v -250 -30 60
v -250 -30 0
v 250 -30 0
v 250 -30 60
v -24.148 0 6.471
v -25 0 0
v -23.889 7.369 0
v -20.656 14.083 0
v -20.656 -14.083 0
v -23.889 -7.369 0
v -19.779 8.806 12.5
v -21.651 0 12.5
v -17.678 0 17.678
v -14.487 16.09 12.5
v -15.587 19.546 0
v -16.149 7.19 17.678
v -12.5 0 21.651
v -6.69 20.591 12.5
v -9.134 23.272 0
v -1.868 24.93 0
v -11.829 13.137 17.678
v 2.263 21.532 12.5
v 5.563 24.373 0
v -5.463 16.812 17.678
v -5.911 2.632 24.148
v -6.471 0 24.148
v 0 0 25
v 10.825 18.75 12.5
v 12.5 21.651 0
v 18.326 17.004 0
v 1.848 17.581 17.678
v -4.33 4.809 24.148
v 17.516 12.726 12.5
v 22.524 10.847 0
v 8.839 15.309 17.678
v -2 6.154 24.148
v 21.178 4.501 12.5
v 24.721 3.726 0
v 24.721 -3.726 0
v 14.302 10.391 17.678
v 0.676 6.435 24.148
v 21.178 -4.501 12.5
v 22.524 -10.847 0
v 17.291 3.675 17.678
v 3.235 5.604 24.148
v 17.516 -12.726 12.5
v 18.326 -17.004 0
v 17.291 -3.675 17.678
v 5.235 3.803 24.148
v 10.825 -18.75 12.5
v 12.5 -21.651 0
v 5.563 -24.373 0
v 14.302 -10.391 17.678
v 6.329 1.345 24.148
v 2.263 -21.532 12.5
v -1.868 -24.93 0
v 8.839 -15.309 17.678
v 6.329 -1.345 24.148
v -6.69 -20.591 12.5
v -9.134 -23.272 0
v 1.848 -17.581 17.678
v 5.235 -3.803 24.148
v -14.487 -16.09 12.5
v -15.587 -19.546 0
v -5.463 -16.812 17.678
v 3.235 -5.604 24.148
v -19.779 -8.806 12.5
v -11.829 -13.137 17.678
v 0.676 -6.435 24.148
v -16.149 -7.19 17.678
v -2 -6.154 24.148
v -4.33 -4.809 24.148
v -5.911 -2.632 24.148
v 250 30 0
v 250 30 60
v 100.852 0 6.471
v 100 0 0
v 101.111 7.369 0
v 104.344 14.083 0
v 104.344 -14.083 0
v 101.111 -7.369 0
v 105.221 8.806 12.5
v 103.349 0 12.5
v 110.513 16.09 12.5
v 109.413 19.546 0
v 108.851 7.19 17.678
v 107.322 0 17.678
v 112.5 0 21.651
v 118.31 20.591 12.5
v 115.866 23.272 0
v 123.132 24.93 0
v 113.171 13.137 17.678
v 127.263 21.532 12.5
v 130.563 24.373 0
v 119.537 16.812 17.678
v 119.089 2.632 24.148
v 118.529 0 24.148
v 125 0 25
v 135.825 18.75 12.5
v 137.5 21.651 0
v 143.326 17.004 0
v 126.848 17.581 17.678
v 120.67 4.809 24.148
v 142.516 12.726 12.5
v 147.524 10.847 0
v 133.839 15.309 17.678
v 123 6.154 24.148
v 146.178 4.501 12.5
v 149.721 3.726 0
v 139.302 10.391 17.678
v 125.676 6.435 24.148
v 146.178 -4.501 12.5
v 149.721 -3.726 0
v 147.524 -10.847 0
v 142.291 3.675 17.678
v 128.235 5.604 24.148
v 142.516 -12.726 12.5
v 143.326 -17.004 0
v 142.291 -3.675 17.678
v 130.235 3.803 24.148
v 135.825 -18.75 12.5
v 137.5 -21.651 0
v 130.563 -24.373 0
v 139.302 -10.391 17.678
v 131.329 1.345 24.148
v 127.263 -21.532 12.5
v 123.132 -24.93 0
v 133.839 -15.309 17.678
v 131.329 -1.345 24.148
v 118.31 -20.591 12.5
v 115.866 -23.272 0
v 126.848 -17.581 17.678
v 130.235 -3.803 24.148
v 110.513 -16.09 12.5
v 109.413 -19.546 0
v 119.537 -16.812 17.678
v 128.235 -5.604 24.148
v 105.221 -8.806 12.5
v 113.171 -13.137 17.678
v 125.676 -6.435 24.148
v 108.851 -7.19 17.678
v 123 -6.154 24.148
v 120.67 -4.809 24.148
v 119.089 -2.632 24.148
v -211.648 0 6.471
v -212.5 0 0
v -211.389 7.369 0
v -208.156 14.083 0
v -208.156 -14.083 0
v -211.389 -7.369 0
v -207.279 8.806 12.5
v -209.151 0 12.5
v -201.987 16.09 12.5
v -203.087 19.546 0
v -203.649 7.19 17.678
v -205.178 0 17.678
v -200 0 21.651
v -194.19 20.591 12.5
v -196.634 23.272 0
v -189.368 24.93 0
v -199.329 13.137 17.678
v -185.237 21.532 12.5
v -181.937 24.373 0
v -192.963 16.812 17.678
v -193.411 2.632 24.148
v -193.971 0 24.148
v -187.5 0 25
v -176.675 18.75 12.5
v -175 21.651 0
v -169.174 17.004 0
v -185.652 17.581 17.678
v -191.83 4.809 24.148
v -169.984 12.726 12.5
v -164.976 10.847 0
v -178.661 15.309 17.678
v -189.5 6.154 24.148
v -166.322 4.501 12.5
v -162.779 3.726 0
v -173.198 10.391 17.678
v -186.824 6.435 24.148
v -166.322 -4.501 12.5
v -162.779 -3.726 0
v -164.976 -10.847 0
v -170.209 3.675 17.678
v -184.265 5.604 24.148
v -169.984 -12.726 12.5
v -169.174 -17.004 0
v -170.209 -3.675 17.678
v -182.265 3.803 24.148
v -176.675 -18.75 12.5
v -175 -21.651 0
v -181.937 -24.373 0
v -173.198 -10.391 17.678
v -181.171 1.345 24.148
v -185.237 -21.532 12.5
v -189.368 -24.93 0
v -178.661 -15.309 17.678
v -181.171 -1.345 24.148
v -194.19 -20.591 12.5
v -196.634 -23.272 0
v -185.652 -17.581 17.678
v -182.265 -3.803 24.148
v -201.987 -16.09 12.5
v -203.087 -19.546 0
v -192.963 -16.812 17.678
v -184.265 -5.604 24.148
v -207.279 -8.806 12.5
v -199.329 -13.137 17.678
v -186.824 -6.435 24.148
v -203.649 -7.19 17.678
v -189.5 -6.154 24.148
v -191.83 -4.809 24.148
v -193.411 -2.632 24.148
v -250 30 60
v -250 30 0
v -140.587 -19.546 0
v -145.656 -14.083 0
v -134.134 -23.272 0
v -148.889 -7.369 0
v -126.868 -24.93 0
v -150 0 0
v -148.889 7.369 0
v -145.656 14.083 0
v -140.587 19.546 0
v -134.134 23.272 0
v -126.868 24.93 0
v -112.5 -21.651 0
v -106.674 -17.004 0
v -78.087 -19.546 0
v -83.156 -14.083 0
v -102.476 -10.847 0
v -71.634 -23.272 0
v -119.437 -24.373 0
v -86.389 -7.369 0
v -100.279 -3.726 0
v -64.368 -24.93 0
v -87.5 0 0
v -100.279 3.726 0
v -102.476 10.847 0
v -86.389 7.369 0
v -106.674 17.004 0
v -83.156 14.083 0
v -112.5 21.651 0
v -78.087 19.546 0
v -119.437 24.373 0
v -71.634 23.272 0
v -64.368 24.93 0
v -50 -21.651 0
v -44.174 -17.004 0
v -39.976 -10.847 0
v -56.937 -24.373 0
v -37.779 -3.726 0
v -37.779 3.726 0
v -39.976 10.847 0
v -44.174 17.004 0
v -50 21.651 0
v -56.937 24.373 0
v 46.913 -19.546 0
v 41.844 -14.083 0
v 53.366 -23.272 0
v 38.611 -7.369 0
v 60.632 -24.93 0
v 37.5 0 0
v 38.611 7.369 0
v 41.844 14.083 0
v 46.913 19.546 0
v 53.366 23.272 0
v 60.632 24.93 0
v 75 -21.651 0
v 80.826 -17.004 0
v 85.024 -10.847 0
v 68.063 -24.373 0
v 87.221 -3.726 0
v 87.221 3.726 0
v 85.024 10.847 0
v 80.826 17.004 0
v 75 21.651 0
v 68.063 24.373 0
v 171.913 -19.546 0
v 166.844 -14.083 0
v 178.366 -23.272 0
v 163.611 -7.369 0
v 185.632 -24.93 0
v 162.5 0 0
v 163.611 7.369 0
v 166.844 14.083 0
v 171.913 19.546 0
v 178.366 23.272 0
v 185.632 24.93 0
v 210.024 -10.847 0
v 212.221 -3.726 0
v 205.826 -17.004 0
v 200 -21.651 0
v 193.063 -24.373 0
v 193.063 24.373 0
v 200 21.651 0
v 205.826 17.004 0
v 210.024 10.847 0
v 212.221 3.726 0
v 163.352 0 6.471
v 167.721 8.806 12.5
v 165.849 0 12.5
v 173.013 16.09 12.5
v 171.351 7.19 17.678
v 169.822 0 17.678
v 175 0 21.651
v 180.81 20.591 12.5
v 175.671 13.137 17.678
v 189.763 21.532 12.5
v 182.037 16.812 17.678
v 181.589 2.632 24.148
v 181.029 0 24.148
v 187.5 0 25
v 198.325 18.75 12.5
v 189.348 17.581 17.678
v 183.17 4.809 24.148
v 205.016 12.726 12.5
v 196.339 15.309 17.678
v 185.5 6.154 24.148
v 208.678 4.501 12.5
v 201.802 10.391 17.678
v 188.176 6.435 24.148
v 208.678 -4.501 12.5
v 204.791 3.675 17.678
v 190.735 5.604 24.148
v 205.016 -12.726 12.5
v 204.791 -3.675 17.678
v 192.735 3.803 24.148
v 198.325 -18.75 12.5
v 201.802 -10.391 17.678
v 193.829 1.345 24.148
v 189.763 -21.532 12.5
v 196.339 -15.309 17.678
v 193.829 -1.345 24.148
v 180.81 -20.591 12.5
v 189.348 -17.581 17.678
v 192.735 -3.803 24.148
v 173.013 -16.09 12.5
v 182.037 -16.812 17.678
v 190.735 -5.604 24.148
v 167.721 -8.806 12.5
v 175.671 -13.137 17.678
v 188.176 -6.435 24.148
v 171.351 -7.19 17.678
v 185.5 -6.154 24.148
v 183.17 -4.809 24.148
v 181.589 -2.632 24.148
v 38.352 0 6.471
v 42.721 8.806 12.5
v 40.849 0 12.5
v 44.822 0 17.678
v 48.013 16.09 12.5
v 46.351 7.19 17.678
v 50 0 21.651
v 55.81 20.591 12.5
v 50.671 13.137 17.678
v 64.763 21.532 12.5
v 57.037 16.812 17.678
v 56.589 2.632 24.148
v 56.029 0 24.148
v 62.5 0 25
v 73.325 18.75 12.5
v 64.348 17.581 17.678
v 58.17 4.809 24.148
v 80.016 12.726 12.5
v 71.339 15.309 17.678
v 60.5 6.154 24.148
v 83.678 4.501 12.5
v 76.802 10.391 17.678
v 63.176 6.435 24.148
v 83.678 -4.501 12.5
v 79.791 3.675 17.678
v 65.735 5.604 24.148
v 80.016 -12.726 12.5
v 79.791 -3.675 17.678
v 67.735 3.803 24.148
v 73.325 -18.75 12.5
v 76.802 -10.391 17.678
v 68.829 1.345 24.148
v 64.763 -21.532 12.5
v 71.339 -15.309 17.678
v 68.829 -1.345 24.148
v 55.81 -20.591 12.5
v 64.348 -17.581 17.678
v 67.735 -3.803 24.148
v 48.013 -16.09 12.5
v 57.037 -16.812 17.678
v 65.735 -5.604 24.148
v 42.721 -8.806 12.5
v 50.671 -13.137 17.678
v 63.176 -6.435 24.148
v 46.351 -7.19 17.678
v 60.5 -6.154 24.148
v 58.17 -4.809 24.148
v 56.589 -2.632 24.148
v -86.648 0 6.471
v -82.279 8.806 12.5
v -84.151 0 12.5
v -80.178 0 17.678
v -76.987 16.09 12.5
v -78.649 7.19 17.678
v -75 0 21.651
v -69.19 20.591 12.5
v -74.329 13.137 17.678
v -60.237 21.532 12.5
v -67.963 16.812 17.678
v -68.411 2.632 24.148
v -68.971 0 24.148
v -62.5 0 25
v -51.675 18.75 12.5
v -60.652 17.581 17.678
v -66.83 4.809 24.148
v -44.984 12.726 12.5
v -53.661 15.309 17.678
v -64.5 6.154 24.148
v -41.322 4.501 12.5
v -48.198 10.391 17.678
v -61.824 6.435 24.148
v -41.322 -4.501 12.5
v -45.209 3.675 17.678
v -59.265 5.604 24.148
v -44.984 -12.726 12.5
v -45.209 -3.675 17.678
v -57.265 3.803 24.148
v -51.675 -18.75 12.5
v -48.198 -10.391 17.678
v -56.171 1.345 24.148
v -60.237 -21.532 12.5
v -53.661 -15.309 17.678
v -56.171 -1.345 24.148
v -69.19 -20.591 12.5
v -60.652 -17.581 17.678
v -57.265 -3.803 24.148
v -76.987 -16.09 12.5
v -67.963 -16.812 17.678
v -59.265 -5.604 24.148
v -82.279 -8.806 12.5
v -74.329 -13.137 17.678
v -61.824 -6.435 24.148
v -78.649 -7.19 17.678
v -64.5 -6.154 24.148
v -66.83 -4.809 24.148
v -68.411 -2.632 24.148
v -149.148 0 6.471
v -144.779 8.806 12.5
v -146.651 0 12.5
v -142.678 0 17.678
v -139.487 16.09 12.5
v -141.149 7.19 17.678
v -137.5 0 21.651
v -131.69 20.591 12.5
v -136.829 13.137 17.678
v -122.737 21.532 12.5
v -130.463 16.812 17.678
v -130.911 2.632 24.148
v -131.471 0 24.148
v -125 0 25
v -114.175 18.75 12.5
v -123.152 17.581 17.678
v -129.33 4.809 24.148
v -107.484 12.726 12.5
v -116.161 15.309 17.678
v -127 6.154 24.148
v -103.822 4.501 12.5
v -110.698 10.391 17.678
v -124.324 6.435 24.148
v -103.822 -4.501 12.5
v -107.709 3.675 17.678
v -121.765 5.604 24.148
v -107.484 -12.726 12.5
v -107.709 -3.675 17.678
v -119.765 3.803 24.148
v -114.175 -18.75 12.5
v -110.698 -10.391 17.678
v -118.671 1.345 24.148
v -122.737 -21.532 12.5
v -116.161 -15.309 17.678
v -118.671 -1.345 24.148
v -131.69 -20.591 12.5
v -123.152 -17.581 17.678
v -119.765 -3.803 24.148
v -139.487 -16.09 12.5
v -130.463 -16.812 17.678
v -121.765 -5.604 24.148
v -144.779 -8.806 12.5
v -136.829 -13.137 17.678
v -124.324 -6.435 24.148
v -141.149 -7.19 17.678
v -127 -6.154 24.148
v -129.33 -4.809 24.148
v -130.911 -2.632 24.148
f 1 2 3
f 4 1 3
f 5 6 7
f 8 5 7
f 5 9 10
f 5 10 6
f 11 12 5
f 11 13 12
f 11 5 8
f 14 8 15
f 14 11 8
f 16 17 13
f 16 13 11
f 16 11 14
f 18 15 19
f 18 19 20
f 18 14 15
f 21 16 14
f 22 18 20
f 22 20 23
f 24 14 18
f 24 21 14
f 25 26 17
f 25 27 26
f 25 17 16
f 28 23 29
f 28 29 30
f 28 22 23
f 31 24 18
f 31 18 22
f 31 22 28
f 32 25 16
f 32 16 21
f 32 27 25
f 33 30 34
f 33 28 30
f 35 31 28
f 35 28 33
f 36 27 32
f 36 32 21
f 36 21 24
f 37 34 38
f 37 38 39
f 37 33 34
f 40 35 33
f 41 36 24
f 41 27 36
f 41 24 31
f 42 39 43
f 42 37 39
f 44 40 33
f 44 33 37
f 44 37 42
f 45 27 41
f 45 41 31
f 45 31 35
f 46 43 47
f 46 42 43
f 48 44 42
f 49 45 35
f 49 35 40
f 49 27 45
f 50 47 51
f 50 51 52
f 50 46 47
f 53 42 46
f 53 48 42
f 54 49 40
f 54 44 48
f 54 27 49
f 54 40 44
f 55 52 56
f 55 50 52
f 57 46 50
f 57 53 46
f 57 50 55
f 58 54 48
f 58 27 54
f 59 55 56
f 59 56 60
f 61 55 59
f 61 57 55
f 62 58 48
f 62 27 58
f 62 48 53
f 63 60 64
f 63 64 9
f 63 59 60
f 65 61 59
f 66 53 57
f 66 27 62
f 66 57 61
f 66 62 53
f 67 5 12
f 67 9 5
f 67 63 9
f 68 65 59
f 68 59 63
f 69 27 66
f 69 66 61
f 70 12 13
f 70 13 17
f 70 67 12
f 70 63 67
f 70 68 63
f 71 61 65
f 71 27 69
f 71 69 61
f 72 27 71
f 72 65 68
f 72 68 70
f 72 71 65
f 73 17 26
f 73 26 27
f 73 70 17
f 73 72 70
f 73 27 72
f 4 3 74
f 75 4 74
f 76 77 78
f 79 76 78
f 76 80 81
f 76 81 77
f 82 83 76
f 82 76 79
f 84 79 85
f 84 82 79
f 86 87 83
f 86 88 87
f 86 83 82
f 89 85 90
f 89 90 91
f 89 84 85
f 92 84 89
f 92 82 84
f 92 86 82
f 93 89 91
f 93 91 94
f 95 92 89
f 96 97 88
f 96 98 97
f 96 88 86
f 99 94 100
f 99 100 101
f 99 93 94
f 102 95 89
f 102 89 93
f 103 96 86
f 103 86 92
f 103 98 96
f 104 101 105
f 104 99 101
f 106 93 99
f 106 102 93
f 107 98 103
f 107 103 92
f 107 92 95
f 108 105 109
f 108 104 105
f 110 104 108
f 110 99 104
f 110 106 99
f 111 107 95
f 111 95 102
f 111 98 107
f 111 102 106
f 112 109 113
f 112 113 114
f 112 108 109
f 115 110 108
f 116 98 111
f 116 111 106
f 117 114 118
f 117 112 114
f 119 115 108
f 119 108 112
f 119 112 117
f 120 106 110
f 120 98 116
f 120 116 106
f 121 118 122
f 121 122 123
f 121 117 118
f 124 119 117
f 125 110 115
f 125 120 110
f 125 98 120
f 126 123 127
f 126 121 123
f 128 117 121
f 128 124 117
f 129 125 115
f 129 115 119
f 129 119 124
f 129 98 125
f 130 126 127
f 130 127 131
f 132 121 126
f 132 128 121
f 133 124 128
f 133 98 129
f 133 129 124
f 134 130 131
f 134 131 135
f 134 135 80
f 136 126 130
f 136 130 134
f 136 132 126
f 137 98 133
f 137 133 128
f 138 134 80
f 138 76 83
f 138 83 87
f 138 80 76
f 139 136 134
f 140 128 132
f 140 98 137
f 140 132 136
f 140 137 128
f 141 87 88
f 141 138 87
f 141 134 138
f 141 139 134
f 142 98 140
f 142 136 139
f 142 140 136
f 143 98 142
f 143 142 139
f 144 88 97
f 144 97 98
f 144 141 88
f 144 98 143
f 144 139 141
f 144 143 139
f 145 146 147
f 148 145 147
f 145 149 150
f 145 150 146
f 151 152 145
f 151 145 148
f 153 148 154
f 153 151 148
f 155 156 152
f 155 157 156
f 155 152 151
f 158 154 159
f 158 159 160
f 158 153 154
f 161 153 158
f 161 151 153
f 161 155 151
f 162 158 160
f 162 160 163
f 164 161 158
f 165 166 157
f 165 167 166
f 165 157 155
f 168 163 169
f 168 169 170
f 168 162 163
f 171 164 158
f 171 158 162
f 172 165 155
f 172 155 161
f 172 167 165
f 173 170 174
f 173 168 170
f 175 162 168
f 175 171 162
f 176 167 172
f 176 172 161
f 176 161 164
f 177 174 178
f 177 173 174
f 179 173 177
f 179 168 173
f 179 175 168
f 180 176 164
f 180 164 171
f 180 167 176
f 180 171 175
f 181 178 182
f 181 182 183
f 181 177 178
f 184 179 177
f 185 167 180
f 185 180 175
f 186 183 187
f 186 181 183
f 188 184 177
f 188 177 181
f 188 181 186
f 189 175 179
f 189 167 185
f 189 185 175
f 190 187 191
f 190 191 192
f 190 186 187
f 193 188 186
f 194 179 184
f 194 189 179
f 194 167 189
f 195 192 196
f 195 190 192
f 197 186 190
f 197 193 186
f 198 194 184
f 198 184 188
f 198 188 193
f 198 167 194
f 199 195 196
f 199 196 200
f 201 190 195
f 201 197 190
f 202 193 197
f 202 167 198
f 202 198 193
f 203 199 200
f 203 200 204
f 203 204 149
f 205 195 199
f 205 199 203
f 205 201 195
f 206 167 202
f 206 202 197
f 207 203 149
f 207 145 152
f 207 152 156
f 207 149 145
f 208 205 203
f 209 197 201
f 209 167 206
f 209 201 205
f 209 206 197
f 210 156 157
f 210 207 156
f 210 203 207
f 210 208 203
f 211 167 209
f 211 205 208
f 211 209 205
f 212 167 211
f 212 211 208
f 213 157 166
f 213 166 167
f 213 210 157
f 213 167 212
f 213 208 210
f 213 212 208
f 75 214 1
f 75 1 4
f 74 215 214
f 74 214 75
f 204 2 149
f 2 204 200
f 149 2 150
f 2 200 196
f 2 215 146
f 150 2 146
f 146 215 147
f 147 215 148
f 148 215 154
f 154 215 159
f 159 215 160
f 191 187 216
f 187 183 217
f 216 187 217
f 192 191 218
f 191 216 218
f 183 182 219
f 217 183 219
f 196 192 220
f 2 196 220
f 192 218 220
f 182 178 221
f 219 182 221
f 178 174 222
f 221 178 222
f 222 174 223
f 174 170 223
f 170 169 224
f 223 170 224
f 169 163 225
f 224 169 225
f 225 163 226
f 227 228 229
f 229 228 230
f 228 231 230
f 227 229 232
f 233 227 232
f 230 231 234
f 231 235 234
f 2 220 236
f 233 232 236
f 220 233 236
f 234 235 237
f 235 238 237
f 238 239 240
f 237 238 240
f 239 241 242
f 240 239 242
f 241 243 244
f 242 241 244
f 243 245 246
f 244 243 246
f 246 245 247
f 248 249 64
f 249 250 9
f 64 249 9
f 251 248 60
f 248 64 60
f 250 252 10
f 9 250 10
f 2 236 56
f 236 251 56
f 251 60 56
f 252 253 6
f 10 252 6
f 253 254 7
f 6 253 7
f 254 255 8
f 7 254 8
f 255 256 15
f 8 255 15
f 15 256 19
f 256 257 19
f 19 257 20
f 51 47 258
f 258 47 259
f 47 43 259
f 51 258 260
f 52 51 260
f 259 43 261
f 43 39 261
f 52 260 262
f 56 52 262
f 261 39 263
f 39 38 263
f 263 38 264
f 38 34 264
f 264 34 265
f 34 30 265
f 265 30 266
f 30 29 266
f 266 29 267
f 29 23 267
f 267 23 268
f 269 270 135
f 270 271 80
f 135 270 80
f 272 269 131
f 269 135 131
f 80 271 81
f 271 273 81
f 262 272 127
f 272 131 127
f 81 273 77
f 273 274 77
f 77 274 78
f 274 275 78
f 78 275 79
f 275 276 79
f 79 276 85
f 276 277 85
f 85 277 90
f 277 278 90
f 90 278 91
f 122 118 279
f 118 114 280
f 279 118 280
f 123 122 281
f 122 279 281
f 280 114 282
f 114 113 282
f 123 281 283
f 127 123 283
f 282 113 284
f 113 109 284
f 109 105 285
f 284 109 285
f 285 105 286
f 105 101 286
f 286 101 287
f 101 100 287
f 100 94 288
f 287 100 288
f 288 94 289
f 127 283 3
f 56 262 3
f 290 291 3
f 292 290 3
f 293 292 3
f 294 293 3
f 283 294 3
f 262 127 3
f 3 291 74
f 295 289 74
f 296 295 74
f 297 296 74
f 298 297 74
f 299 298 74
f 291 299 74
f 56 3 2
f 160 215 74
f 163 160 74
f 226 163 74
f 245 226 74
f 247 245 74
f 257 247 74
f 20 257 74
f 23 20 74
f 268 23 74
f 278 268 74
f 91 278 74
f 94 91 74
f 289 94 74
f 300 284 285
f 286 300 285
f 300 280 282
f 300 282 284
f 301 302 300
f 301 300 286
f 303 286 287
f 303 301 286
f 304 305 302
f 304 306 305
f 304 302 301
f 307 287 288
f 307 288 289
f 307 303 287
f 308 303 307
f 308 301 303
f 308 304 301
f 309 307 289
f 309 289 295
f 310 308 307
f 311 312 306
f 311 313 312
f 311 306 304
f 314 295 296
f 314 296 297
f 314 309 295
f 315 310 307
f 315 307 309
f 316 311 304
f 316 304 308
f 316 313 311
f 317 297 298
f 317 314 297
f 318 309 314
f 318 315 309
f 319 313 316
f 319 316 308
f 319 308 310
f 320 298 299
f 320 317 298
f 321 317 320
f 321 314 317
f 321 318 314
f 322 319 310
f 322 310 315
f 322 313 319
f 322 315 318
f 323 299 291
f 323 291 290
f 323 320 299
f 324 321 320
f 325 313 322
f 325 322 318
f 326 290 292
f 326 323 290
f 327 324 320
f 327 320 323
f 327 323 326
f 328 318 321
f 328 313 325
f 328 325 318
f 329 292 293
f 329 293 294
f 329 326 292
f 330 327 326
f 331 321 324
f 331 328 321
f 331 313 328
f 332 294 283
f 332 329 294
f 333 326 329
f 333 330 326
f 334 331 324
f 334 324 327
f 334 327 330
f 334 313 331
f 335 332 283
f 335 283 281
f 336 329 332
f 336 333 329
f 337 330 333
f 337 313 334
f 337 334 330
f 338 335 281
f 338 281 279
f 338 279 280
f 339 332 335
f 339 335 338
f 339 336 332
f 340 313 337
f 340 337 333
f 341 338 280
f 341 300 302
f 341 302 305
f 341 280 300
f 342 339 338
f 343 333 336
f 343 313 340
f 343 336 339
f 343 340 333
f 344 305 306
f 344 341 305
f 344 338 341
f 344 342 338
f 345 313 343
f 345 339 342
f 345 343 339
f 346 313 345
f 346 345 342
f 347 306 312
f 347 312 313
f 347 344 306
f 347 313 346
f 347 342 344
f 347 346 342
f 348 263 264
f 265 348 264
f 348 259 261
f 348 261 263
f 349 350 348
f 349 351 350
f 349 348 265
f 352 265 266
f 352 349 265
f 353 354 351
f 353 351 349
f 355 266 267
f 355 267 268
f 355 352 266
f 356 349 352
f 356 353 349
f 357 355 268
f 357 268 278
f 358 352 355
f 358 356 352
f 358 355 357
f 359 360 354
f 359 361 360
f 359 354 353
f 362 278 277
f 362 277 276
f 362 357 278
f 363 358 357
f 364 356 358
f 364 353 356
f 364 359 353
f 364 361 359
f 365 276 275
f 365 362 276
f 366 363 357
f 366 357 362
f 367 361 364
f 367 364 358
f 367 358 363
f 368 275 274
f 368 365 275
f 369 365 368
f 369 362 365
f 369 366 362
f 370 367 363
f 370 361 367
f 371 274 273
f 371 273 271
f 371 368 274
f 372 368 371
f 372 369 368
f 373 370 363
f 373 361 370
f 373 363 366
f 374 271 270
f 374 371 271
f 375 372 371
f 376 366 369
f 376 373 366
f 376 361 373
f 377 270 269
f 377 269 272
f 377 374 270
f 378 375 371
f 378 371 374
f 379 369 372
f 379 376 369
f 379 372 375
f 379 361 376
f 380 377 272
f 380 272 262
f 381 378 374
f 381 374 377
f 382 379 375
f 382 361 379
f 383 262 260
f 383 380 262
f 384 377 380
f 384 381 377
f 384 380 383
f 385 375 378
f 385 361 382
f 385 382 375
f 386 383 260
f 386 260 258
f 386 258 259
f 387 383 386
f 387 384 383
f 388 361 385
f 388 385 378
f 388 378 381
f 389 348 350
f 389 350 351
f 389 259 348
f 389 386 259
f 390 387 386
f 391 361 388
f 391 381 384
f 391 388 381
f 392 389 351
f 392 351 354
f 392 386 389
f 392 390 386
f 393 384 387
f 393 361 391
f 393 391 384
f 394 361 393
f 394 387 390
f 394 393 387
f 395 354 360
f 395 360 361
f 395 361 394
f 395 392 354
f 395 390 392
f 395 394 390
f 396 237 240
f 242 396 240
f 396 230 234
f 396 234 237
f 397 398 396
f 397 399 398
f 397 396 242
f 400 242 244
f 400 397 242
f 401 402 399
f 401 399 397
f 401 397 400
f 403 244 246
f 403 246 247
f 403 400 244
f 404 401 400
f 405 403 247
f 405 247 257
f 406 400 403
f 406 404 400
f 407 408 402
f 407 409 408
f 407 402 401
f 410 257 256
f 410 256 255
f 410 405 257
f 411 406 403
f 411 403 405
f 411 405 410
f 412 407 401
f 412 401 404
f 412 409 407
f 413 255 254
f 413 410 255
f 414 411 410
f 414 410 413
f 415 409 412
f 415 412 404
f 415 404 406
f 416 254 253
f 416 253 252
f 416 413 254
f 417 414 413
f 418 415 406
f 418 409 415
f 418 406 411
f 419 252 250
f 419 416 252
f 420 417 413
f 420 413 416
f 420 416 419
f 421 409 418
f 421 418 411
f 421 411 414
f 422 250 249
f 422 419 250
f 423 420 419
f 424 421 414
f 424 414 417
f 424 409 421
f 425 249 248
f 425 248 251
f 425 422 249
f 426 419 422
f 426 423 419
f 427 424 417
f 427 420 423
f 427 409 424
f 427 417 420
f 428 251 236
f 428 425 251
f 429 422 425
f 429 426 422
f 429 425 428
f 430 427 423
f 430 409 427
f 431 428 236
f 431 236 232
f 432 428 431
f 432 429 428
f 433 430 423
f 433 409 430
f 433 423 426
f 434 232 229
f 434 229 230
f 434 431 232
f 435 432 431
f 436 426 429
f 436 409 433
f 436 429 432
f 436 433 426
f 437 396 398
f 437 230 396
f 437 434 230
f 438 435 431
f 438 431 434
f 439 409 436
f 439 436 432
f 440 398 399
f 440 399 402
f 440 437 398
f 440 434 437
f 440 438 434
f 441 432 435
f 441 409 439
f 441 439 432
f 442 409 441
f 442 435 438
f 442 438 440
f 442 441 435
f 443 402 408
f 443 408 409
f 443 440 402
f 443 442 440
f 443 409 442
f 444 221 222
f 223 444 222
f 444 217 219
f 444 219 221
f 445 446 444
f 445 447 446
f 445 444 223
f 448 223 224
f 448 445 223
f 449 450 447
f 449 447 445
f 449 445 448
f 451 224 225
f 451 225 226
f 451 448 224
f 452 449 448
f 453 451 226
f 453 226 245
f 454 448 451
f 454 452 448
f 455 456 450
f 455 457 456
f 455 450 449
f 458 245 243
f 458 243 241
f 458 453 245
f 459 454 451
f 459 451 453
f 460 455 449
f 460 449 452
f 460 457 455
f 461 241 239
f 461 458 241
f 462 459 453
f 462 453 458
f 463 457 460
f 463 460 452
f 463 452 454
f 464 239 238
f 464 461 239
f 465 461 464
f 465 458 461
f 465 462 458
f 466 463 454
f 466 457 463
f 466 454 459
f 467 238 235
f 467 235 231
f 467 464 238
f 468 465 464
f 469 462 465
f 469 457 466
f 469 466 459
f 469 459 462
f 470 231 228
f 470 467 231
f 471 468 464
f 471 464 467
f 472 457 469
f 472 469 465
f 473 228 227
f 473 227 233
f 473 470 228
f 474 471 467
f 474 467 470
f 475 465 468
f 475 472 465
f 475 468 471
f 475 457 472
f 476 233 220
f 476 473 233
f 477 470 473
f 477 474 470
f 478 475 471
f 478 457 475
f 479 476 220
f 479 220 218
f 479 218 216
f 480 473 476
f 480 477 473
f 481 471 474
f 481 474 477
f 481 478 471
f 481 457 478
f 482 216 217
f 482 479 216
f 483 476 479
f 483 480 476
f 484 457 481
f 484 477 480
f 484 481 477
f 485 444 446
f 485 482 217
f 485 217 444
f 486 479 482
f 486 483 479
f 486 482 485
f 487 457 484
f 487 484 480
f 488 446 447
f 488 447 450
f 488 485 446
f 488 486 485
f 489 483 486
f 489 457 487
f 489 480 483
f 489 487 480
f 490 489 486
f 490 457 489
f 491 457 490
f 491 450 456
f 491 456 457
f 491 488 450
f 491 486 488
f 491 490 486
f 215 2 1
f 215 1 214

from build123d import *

# Parameters (mm, degrees)
SZKIC1_W                    = 500
SZKIC1_H                    = 60
DODANIE_WYCI_GNI_CIE1_DEPTH = 60
SZKIC2_R                    = 25
WYTNIJ_WYCI_GNI_CIE1_DEPTH  = 25
ZAOKR_GLENIE2_R             = 25


with BuildPart() as part:
    # Szkic1 → Dodanie-wyciągnięcie1 (new body)
    with BuildSketch(Plane.XY):
        Rectangle(SZKIC1_W, SZKIC1_H)
    extrude(amount=DODANIE_WYCI_GNI_CIE1_DEPTH)

    # Szkic2 → Wytnij-wyciągnięcie1 (cut)
    with BuildSketch(Plane(origin=(0, 0, 0), x_dir=(-1, 0, 0), z_dir=(0, 0, -1))):
        with Locations((-187.5, 0)):
            Circle(SZKIC2_R)
        with Locations((-125, 0)):
            Circle(SZKIC2_R)
        with Locations((-62.5, 0)):
            Circle(SZKIC2_R)
        Circle(SZKIC2_R)
        with Locations((62.5, 0)):
            Circle(SZKIC2_R)
        with Locations((125, 0)):
            Circle(SZKIC2_R)
        with Locations((187.5, 0)):
            Circle(SZKIC2_R)
    extrude(amount=-WYTNIJ_WYCI_GNI_CIE1_DEPTH, mode=Mode.SUBTRACT)

    # Zaokrąglenie2
    zaokr_glenie2_edges = [part.edges().sort_by_distance(p)[0] for p in [
        (212.5, 0, 25),
        (150, 0, 25),
        (87.5, 0, 25),
        (25, 0, 25),
        (-37.5, 0, 25),
        (-100, 0, 25),
        (-162.5, 0, 25),
    ]]
    fillet(zaokr_glenie2_edges, radius=ZAOKR_GLENIE2_R - 0.0001)  # a hair under: the kernel refuses the full size


solid = part.part
